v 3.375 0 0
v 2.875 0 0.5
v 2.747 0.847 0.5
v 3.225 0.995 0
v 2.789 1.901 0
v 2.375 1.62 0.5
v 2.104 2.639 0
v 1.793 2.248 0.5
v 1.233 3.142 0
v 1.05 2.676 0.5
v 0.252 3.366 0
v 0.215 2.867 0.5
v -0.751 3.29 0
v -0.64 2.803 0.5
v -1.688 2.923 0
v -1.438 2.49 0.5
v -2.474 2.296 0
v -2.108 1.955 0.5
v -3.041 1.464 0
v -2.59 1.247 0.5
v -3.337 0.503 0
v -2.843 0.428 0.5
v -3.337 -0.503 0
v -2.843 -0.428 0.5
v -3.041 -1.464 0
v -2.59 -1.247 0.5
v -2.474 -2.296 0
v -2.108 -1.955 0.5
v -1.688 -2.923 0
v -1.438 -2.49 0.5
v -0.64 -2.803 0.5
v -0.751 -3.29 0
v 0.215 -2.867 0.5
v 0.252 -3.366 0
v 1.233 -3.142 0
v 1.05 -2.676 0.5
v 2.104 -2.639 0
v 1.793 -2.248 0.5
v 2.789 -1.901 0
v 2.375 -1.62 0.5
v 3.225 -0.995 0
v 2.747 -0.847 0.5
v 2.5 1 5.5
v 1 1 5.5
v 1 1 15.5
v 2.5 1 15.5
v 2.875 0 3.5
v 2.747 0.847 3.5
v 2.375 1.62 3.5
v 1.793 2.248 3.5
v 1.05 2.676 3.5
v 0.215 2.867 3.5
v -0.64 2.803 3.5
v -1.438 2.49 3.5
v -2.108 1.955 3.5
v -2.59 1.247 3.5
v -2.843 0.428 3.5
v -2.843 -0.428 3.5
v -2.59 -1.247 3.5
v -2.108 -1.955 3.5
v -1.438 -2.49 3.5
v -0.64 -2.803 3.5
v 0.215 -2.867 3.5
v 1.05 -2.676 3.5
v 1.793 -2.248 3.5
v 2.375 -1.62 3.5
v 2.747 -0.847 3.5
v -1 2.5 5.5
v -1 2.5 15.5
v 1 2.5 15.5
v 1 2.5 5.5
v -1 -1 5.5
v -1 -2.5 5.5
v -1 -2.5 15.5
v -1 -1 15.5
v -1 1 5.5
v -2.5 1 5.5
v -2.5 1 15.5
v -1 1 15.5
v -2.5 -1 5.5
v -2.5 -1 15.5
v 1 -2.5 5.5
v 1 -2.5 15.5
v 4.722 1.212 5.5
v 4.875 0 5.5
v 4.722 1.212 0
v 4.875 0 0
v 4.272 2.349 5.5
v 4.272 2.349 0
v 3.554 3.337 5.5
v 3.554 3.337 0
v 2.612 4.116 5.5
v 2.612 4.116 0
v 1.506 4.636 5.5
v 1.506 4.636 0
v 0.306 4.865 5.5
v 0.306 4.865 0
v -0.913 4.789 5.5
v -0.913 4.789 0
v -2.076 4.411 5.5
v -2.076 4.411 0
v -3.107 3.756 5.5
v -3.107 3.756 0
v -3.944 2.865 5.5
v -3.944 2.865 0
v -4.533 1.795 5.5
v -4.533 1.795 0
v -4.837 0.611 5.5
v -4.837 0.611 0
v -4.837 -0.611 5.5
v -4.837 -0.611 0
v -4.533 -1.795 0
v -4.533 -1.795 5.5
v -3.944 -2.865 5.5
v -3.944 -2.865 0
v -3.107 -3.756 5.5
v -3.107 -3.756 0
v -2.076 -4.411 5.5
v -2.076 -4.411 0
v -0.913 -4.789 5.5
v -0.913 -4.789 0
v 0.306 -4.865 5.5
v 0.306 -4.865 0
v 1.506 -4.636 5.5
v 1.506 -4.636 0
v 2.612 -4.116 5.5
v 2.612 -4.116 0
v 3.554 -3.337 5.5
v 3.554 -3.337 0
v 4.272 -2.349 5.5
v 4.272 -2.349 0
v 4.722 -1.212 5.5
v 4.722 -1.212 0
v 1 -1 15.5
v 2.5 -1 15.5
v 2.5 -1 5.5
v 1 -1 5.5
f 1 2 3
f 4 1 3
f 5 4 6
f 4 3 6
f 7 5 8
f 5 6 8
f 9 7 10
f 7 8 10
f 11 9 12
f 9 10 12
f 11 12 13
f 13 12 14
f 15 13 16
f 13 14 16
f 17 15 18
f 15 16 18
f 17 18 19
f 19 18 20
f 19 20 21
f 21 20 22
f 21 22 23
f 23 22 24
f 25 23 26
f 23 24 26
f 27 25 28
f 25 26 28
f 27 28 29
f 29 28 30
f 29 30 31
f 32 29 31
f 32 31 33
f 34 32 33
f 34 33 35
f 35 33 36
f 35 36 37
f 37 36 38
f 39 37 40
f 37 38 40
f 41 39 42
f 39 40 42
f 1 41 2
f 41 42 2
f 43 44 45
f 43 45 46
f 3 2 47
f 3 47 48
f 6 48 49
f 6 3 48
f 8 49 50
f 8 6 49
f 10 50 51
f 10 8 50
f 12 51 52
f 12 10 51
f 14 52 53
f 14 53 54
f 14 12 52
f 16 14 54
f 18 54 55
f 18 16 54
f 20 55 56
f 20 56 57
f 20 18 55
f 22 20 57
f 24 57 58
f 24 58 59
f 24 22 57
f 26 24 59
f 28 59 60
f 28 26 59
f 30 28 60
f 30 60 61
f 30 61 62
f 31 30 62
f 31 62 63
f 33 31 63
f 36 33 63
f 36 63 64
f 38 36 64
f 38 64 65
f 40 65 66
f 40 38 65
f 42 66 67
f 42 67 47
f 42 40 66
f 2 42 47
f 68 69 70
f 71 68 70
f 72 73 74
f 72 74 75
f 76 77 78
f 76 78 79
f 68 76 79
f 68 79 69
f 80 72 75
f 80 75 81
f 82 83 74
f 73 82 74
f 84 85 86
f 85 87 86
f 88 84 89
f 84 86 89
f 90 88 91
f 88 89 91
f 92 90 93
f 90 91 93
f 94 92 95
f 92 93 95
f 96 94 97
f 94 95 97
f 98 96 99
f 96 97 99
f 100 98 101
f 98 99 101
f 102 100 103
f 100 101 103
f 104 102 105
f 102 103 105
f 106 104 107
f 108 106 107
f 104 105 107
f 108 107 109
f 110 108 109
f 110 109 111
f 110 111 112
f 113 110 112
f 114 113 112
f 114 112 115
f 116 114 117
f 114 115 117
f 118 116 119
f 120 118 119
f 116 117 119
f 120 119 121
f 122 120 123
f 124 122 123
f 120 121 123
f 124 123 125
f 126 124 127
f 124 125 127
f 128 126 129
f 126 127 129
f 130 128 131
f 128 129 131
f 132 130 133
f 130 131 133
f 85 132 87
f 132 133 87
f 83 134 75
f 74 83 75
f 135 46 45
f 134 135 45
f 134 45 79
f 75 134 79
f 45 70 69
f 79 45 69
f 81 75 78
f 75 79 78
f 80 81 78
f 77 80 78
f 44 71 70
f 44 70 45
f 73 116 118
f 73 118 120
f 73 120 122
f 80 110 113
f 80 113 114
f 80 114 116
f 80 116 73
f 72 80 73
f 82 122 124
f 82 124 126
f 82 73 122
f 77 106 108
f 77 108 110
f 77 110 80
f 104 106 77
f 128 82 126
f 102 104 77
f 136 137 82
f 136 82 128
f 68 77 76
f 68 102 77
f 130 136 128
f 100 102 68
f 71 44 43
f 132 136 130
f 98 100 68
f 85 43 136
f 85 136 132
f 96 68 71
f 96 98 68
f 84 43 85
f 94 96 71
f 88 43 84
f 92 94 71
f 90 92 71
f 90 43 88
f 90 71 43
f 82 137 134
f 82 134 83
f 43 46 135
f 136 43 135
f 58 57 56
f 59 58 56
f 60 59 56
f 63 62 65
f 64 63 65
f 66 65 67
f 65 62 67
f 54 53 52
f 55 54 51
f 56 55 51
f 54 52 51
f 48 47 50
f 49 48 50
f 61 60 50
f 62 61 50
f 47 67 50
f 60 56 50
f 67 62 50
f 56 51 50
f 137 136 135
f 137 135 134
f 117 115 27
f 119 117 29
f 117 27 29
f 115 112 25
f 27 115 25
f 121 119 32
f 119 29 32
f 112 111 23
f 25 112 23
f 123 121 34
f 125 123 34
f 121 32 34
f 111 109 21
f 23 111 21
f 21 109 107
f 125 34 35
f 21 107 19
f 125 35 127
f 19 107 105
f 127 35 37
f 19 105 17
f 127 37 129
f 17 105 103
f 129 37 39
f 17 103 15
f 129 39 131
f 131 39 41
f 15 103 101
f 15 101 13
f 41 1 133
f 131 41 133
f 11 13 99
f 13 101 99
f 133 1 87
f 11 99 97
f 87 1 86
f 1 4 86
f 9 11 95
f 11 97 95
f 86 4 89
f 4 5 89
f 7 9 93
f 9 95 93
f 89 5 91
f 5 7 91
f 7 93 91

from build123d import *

# Parameters (mm, degrees)
SKETCH1_R           = 4.875
SKETCH1_R_2         = 2.875
BOSS_EXTRUDE1_DEPTH = 3.5
SKETCH2_R           = 4.875
BOSS_EXTRUDE2_DEPTH = 2
CHAMFER1_SIZE       = 0.5
BOSS_EXTRUDE3_DEPTH = 10


with BuildPart() as part:
    # Sketch1 → Boss-Extrude1 (new body)
    with BuildSketch(Plane.XY):
        Circle(SKETCH1_R)
        Circle(SKETCH1_R_2, mode=Mode.SUBTRACT)
    extrude(amount=BOSS_EXTRUDE1_DEPTH)

    # Sketch2 → Boss-Extrude2 (add)
    with BuildSketch(Plane.XY.offset(3.5)):
        Circle(SKETCH2_R)
    extrude(amount=BOSS_EXTRUDE2_DEPTH)

    # Chamfer1
    chamfer1_edges = [part.edges().sort_by_distance(p)[0] for p in [
        (-2.875, 0, 0),
    ]]
    chamfer(chamfer1_edges, length=CHAMFER1_SIZE)

    # Sketch3 → Boss-Extrude3 (add)
    with BuildSketch(Plane.XY.offset(5.5)):
        Polygon((-1, 2.5), (1, 2.5), (1, 1), (2.5, 1), (2.5, -1), (1, -1), (1, -2.5), (-1, -2.5), (-1, -1), (-2.5, -1), (-2.5, 1), (-1, 1), align=None)
    extrude(amount=BOSS_EXTRUDE3_DEPTH)


solid = part.part
